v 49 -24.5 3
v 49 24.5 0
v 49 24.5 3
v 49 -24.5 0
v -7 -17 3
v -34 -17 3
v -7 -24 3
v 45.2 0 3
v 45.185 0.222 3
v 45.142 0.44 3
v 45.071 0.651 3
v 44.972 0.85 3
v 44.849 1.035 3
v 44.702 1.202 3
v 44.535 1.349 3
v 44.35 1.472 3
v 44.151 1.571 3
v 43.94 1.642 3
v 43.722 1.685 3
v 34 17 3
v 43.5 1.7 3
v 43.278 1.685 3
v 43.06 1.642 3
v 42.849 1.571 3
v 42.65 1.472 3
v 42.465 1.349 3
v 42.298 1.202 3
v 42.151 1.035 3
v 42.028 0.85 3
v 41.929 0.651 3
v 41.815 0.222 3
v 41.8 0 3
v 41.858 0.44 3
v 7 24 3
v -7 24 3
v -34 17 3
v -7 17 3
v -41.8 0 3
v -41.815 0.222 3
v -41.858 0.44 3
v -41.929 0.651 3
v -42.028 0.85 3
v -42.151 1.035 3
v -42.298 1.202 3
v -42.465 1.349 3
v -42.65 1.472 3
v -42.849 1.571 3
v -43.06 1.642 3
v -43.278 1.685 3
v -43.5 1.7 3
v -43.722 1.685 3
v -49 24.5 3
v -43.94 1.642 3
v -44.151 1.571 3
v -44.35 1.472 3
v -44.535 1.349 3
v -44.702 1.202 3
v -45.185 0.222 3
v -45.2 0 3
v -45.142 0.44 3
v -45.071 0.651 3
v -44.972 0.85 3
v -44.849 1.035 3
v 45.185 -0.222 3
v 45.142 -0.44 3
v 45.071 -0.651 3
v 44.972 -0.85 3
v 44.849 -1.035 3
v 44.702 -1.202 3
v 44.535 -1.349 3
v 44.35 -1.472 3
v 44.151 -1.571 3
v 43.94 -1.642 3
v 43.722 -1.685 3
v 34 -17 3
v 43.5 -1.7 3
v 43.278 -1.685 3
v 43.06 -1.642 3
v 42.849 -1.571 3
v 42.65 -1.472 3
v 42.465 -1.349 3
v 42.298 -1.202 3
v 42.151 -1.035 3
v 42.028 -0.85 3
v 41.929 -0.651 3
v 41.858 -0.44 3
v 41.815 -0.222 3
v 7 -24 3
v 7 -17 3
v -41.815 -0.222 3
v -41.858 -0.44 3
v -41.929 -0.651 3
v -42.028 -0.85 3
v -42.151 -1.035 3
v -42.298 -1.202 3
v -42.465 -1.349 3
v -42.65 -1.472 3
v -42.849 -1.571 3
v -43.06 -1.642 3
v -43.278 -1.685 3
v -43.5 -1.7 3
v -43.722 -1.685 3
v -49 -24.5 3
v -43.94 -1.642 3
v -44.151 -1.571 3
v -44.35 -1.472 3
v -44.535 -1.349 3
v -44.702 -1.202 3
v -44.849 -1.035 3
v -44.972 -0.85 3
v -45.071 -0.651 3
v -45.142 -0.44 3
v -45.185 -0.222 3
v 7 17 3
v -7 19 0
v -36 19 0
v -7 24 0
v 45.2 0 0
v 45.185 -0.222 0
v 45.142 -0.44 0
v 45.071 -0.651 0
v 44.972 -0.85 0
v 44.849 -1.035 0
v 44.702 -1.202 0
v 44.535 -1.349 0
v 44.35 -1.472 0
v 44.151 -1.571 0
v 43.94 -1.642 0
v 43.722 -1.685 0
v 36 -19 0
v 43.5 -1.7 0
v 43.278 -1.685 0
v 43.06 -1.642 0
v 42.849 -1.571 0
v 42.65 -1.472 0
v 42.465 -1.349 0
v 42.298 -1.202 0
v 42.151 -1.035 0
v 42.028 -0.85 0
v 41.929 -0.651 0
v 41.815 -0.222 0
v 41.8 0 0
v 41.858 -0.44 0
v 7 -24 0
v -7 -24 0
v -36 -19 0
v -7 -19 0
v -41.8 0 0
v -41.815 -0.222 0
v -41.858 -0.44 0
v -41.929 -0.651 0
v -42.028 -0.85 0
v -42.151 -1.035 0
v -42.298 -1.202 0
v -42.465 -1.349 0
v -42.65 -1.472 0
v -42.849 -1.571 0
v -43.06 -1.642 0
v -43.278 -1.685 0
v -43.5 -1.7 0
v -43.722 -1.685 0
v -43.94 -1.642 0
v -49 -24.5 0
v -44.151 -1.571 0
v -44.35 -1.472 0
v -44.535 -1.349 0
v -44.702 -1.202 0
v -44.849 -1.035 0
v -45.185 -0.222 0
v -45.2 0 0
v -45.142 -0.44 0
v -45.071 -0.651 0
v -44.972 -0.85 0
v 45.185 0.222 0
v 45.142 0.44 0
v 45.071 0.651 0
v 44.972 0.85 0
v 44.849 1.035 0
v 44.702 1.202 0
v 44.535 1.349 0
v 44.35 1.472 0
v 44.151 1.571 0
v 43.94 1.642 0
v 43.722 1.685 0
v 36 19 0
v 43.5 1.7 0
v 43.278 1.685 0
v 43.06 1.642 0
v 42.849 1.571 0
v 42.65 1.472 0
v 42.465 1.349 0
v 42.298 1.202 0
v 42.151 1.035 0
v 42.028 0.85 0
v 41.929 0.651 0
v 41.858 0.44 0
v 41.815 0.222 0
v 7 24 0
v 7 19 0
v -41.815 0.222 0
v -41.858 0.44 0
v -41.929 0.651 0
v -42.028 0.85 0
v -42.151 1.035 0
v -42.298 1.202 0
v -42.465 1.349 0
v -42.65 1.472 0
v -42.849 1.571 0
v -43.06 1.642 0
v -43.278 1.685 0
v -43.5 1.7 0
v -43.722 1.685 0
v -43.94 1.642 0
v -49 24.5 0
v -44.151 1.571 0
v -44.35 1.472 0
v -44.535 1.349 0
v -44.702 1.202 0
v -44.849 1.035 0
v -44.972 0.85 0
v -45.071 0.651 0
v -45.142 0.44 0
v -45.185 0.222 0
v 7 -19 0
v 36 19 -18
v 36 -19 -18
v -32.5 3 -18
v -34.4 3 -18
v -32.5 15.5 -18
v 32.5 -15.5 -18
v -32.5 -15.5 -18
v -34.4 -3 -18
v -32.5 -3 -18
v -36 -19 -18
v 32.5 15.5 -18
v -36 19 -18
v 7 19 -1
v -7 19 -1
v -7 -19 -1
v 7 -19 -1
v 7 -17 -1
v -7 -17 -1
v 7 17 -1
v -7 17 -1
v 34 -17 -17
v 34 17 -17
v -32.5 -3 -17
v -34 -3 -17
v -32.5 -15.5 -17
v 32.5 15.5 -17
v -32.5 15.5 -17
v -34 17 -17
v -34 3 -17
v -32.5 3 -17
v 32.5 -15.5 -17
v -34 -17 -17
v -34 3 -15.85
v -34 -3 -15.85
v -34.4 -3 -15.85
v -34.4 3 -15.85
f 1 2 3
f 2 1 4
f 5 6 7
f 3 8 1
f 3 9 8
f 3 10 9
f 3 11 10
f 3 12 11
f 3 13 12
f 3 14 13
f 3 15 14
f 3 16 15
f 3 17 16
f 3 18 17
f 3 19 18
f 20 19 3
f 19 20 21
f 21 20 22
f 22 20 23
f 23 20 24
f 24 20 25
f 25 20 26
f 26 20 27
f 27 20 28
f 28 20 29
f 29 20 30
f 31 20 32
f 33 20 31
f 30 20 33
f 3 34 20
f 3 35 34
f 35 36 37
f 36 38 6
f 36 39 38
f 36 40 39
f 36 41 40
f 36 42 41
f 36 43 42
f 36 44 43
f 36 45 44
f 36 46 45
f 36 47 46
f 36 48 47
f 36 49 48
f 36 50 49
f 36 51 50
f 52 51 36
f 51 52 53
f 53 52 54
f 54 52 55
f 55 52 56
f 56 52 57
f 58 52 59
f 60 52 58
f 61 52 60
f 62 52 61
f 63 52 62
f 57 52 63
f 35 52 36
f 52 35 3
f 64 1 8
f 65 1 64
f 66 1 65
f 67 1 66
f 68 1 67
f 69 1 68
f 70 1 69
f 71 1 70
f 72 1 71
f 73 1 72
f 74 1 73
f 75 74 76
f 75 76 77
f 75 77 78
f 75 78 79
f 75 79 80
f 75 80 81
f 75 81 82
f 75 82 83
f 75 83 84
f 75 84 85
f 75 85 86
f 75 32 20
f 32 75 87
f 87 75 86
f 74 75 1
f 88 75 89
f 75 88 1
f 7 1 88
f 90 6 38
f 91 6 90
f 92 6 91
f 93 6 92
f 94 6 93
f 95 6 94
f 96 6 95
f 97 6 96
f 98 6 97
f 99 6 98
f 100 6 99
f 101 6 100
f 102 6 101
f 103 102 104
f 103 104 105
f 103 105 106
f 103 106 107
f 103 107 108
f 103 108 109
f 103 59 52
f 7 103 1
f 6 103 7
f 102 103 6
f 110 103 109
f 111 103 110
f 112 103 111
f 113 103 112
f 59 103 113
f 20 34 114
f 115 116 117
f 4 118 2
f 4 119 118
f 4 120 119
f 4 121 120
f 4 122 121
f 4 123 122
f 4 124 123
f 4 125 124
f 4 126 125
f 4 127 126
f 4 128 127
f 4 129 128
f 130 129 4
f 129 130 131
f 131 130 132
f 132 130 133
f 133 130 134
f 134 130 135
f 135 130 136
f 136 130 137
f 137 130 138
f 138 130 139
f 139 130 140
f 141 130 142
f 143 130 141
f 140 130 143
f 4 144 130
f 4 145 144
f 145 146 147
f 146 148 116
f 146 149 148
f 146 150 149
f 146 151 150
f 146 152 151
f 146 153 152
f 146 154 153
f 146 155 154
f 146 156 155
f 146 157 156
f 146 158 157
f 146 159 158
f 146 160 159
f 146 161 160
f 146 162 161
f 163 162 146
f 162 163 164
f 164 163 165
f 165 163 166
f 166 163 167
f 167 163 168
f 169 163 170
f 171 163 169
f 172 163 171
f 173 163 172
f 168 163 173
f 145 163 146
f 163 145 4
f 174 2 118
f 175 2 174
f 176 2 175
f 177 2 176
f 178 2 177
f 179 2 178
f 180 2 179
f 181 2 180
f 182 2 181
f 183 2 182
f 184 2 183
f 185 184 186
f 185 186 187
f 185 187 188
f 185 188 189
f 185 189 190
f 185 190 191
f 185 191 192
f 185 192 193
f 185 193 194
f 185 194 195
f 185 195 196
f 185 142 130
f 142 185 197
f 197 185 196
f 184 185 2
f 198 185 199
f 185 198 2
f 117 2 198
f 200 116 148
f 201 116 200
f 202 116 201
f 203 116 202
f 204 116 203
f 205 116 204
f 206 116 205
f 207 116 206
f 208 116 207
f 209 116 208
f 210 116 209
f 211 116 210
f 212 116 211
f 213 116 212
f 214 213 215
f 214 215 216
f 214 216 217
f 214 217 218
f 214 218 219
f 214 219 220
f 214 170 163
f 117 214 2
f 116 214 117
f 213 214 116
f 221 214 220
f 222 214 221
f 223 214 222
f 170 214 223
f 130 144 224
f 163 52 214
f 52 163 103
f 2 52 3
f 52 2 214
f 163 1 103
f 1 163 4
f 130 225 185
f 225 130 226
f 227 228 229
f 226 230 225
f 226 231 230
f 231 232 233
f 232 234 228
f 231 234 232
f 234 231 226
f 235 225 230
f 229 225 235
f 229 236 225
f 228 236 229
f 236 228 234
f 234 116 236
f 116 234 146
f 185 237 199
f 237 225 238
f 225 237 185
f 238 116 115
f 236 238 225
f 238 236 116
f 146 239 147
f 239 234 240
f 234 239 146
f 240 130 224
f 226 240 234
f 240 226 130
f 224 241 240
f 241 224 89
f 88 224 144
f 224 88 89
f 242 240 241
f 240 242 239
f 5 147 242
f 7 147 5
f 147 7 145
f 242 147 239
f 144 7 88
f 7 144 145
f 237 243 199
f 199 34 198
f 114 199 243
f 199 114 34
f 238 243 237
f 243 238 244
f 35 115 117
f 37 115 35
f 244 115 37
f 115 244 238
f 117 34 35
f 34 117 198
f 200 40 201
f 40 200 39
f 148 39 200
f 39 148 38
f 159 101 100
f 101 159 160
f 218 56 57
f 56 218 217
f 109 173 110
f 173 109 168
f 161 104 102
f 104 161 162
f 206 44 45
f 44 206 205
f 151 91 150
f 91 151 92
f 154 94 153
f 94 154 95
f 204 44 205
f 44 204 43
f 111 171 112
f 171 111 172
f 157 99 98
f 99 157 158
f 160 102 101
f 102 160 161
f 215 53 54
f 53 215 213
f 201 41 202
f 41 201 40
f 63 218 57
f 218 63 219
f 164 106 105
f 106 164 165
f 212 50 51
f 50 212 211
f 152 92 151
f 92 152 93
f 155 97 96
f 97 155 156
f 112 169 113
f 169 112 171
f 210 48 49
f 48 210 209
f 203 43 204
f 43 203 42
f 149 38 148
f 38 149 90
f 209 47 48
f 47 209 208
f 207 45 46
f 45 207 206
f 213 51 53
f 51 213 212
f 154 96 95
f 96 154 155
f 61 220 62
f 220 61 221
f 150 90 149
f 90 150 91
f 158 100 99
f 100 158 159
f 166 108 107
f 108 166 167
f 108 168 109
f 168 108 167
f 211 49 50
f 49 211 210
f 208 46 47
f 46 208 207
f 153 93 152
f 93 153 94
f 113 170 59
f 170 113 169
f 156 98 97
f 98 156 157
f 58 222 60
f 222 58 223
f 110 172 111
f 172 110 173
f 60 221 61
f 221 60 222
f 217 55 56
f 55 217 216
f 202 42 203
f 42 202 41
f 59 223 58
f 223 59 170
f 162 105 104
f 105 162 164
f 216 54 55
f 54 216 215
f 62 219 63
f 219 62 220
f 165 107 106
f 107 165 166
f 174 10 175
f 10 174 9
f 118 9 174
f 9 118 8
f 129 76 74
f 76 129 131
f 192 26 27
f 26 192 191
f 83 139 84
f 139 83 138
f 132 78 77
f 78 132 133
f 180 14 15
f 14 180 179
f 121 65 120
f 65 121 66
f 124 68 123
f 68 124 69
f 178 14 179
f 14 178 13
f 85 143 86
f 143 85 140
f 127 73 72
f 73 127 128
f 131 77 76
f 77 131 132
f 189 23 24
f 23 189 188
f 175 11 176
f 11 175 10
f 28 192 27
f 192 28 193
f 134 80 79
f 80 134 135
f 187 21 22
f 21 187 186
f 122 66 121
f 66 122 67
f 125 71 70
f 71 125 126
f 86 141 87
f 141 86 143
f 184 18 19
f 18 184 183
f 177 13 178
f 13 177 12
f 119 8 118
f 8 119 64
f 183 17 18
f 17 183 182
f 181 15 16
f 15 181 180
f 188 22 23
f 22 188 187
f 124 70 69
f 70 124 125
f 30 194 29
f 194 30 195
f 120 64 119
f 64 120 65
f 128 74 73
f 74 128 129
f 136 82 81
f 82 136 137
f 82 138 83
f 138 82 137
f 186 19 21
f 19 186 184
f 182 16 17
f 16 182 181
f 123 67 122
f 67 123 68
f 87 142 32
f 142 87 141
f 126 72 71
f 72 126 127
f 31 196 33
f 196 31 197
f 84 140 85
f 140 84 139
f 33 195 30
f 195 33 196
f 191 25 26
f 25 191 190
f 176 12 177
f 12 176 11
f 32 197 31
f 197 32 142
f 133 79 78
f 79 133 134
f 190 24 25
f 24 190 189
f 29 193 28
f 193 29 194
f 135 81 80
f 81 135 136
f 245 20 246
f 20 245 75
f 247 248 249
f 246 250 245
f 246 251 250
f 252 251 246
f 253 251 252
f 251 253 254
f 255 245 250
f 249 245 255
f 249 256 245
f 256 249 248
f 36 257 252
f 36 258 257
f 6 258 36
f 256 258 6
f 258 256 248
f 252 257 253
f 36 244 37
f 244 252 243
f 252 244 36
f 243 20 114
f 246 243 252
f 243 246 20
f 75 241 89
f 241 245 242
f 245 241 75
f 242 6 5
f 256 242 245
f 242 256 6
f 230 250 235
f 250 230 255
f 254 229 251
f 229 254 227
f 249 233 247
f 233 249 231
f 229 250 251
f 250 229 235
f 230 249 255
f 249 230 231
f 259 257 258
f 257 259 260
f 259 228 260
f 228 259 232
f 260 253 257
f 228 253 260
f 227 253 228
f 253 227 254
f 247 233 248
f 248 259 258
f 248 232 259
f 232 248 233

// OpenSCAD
/*
 InfoWindow: two-AA rechargeable battery holder mounting bezel
 Experimental fit-check v0.1. NOT a final fabrication drawing.
 Designed around a common enclosed holder 67 x 33 x 19 mm,
 e.g. Multicomp MP000368/MP000375. Verify actual holder and
 Perspex dimensions before cutting. Assumes battery holder has a
 removable lid accessible from the REAR (positive Z).

 Coordinate model: Perspex rear surface is z=0, Perspex/front-screen
 space is negative Z. The flange remains on the Perspex rear face;
 the sleeve projects through a rectangular slot towards the display.
 External M3 fasteners clamp the bezel to the Perspex via washers;
 do not tap or countersink thin Perspex directly.

 This printed part is a MOUNTING BEZEL, not a battery holder.
 An actual battery holder provides the metal contacts and lid.
 The holder is retained in the bezel by a removable nonconductive
 side adhesive/clip solution developed after test fit. Do not glue
 the lid shut. Verify sufficient room for lid sliding direction.
*/
$fn=48;

// Measured nominal 2x AA box dimensions in millimetres.
holder_l=67;
holder_w=33;
holder_h=19;

// Printer/holder tolerance: 0.5mm clearance on EACH side.
clearance=0.5;
wall=2.0;
flange_thickness=3.0;
sleeve_depth=18.0;
flange_l=98;
flange_w=49;

// Screw holes through flange; Perspex holes should be independently
// drilled to a suitable clearance based on its thickness/expansion.
hole_d=3.4;
hole_spacing=87; // two mounting holes, separated along length

inside_l=holder_l+2*clearance;
inside_w=holder_w+2*clearance;
sleeve_l=inside_l+2*wall;
sleeve_w=inside_w+2*wall;

// Nominal Perspex rectangular slot: ~ (sleeve_l+1) x (sleeve_w+1).
// Here: 73mm x 39mm; verify after printing the bezel.

difference() {
    union() {
        // Rear-visible fixing flange z=0..3
        translate([-flange_l/2,-flange_w/2,0])
            cube([flange_l,flange_w,flange_thickness]);
        // Sleeve projecting through Perspex towards the screen
        translate([-sleeve_l/2,-sleeve_w/2,-sleeve_depth])
            cube([sleeve_l,sleeve_w,sleeve_depth]);
    }

    // Main receptacle; rear opening kept fully accessible.
    // Bottom 1mm of sleeve is a retaining ledge.
    translate([-inside_l/2,-inside_w/2,-sleeve_depth+1.0])
        cube([inside_l,inside_w,sleeve_depth+flange_thickness]);

    // Bottom opening retains a ~1.5mm wide seating lip.
    translate([-(inside_l-3)/2,-(inside_w-3)/2,-sleeve_depth-0.05])
        cube([inside_l-3,inside_w-3,1.15]);

    // Wire exit from near one short end of holder, through shelf.
    translate([-inside_l/2-0.4,-3,-sleeve_depth-0.05])
        cube([6,6,2.2]);

    // Finger-access cutouts on both long sides of the rear flange.
    // These permit pulling the enclosed battery box from the bezel
    // for lid removal even if its lid slides sideways.
    for(side=[-1,1])
      translate([-7.0,side>0 ? inside_w/2-0.5 : -inside_w/2-7.0,-1.0])
        cube([14.0,7.5,flange_thickness+1.1]);

    // Two accessible flat-head-free fixing holes.
    for(x=[-hole_spacing/2,hole_spacing/2])
      translate([x,0,-0.1])
        cylinder(h=flange_thickness+0.2,d=hole_d);
}
